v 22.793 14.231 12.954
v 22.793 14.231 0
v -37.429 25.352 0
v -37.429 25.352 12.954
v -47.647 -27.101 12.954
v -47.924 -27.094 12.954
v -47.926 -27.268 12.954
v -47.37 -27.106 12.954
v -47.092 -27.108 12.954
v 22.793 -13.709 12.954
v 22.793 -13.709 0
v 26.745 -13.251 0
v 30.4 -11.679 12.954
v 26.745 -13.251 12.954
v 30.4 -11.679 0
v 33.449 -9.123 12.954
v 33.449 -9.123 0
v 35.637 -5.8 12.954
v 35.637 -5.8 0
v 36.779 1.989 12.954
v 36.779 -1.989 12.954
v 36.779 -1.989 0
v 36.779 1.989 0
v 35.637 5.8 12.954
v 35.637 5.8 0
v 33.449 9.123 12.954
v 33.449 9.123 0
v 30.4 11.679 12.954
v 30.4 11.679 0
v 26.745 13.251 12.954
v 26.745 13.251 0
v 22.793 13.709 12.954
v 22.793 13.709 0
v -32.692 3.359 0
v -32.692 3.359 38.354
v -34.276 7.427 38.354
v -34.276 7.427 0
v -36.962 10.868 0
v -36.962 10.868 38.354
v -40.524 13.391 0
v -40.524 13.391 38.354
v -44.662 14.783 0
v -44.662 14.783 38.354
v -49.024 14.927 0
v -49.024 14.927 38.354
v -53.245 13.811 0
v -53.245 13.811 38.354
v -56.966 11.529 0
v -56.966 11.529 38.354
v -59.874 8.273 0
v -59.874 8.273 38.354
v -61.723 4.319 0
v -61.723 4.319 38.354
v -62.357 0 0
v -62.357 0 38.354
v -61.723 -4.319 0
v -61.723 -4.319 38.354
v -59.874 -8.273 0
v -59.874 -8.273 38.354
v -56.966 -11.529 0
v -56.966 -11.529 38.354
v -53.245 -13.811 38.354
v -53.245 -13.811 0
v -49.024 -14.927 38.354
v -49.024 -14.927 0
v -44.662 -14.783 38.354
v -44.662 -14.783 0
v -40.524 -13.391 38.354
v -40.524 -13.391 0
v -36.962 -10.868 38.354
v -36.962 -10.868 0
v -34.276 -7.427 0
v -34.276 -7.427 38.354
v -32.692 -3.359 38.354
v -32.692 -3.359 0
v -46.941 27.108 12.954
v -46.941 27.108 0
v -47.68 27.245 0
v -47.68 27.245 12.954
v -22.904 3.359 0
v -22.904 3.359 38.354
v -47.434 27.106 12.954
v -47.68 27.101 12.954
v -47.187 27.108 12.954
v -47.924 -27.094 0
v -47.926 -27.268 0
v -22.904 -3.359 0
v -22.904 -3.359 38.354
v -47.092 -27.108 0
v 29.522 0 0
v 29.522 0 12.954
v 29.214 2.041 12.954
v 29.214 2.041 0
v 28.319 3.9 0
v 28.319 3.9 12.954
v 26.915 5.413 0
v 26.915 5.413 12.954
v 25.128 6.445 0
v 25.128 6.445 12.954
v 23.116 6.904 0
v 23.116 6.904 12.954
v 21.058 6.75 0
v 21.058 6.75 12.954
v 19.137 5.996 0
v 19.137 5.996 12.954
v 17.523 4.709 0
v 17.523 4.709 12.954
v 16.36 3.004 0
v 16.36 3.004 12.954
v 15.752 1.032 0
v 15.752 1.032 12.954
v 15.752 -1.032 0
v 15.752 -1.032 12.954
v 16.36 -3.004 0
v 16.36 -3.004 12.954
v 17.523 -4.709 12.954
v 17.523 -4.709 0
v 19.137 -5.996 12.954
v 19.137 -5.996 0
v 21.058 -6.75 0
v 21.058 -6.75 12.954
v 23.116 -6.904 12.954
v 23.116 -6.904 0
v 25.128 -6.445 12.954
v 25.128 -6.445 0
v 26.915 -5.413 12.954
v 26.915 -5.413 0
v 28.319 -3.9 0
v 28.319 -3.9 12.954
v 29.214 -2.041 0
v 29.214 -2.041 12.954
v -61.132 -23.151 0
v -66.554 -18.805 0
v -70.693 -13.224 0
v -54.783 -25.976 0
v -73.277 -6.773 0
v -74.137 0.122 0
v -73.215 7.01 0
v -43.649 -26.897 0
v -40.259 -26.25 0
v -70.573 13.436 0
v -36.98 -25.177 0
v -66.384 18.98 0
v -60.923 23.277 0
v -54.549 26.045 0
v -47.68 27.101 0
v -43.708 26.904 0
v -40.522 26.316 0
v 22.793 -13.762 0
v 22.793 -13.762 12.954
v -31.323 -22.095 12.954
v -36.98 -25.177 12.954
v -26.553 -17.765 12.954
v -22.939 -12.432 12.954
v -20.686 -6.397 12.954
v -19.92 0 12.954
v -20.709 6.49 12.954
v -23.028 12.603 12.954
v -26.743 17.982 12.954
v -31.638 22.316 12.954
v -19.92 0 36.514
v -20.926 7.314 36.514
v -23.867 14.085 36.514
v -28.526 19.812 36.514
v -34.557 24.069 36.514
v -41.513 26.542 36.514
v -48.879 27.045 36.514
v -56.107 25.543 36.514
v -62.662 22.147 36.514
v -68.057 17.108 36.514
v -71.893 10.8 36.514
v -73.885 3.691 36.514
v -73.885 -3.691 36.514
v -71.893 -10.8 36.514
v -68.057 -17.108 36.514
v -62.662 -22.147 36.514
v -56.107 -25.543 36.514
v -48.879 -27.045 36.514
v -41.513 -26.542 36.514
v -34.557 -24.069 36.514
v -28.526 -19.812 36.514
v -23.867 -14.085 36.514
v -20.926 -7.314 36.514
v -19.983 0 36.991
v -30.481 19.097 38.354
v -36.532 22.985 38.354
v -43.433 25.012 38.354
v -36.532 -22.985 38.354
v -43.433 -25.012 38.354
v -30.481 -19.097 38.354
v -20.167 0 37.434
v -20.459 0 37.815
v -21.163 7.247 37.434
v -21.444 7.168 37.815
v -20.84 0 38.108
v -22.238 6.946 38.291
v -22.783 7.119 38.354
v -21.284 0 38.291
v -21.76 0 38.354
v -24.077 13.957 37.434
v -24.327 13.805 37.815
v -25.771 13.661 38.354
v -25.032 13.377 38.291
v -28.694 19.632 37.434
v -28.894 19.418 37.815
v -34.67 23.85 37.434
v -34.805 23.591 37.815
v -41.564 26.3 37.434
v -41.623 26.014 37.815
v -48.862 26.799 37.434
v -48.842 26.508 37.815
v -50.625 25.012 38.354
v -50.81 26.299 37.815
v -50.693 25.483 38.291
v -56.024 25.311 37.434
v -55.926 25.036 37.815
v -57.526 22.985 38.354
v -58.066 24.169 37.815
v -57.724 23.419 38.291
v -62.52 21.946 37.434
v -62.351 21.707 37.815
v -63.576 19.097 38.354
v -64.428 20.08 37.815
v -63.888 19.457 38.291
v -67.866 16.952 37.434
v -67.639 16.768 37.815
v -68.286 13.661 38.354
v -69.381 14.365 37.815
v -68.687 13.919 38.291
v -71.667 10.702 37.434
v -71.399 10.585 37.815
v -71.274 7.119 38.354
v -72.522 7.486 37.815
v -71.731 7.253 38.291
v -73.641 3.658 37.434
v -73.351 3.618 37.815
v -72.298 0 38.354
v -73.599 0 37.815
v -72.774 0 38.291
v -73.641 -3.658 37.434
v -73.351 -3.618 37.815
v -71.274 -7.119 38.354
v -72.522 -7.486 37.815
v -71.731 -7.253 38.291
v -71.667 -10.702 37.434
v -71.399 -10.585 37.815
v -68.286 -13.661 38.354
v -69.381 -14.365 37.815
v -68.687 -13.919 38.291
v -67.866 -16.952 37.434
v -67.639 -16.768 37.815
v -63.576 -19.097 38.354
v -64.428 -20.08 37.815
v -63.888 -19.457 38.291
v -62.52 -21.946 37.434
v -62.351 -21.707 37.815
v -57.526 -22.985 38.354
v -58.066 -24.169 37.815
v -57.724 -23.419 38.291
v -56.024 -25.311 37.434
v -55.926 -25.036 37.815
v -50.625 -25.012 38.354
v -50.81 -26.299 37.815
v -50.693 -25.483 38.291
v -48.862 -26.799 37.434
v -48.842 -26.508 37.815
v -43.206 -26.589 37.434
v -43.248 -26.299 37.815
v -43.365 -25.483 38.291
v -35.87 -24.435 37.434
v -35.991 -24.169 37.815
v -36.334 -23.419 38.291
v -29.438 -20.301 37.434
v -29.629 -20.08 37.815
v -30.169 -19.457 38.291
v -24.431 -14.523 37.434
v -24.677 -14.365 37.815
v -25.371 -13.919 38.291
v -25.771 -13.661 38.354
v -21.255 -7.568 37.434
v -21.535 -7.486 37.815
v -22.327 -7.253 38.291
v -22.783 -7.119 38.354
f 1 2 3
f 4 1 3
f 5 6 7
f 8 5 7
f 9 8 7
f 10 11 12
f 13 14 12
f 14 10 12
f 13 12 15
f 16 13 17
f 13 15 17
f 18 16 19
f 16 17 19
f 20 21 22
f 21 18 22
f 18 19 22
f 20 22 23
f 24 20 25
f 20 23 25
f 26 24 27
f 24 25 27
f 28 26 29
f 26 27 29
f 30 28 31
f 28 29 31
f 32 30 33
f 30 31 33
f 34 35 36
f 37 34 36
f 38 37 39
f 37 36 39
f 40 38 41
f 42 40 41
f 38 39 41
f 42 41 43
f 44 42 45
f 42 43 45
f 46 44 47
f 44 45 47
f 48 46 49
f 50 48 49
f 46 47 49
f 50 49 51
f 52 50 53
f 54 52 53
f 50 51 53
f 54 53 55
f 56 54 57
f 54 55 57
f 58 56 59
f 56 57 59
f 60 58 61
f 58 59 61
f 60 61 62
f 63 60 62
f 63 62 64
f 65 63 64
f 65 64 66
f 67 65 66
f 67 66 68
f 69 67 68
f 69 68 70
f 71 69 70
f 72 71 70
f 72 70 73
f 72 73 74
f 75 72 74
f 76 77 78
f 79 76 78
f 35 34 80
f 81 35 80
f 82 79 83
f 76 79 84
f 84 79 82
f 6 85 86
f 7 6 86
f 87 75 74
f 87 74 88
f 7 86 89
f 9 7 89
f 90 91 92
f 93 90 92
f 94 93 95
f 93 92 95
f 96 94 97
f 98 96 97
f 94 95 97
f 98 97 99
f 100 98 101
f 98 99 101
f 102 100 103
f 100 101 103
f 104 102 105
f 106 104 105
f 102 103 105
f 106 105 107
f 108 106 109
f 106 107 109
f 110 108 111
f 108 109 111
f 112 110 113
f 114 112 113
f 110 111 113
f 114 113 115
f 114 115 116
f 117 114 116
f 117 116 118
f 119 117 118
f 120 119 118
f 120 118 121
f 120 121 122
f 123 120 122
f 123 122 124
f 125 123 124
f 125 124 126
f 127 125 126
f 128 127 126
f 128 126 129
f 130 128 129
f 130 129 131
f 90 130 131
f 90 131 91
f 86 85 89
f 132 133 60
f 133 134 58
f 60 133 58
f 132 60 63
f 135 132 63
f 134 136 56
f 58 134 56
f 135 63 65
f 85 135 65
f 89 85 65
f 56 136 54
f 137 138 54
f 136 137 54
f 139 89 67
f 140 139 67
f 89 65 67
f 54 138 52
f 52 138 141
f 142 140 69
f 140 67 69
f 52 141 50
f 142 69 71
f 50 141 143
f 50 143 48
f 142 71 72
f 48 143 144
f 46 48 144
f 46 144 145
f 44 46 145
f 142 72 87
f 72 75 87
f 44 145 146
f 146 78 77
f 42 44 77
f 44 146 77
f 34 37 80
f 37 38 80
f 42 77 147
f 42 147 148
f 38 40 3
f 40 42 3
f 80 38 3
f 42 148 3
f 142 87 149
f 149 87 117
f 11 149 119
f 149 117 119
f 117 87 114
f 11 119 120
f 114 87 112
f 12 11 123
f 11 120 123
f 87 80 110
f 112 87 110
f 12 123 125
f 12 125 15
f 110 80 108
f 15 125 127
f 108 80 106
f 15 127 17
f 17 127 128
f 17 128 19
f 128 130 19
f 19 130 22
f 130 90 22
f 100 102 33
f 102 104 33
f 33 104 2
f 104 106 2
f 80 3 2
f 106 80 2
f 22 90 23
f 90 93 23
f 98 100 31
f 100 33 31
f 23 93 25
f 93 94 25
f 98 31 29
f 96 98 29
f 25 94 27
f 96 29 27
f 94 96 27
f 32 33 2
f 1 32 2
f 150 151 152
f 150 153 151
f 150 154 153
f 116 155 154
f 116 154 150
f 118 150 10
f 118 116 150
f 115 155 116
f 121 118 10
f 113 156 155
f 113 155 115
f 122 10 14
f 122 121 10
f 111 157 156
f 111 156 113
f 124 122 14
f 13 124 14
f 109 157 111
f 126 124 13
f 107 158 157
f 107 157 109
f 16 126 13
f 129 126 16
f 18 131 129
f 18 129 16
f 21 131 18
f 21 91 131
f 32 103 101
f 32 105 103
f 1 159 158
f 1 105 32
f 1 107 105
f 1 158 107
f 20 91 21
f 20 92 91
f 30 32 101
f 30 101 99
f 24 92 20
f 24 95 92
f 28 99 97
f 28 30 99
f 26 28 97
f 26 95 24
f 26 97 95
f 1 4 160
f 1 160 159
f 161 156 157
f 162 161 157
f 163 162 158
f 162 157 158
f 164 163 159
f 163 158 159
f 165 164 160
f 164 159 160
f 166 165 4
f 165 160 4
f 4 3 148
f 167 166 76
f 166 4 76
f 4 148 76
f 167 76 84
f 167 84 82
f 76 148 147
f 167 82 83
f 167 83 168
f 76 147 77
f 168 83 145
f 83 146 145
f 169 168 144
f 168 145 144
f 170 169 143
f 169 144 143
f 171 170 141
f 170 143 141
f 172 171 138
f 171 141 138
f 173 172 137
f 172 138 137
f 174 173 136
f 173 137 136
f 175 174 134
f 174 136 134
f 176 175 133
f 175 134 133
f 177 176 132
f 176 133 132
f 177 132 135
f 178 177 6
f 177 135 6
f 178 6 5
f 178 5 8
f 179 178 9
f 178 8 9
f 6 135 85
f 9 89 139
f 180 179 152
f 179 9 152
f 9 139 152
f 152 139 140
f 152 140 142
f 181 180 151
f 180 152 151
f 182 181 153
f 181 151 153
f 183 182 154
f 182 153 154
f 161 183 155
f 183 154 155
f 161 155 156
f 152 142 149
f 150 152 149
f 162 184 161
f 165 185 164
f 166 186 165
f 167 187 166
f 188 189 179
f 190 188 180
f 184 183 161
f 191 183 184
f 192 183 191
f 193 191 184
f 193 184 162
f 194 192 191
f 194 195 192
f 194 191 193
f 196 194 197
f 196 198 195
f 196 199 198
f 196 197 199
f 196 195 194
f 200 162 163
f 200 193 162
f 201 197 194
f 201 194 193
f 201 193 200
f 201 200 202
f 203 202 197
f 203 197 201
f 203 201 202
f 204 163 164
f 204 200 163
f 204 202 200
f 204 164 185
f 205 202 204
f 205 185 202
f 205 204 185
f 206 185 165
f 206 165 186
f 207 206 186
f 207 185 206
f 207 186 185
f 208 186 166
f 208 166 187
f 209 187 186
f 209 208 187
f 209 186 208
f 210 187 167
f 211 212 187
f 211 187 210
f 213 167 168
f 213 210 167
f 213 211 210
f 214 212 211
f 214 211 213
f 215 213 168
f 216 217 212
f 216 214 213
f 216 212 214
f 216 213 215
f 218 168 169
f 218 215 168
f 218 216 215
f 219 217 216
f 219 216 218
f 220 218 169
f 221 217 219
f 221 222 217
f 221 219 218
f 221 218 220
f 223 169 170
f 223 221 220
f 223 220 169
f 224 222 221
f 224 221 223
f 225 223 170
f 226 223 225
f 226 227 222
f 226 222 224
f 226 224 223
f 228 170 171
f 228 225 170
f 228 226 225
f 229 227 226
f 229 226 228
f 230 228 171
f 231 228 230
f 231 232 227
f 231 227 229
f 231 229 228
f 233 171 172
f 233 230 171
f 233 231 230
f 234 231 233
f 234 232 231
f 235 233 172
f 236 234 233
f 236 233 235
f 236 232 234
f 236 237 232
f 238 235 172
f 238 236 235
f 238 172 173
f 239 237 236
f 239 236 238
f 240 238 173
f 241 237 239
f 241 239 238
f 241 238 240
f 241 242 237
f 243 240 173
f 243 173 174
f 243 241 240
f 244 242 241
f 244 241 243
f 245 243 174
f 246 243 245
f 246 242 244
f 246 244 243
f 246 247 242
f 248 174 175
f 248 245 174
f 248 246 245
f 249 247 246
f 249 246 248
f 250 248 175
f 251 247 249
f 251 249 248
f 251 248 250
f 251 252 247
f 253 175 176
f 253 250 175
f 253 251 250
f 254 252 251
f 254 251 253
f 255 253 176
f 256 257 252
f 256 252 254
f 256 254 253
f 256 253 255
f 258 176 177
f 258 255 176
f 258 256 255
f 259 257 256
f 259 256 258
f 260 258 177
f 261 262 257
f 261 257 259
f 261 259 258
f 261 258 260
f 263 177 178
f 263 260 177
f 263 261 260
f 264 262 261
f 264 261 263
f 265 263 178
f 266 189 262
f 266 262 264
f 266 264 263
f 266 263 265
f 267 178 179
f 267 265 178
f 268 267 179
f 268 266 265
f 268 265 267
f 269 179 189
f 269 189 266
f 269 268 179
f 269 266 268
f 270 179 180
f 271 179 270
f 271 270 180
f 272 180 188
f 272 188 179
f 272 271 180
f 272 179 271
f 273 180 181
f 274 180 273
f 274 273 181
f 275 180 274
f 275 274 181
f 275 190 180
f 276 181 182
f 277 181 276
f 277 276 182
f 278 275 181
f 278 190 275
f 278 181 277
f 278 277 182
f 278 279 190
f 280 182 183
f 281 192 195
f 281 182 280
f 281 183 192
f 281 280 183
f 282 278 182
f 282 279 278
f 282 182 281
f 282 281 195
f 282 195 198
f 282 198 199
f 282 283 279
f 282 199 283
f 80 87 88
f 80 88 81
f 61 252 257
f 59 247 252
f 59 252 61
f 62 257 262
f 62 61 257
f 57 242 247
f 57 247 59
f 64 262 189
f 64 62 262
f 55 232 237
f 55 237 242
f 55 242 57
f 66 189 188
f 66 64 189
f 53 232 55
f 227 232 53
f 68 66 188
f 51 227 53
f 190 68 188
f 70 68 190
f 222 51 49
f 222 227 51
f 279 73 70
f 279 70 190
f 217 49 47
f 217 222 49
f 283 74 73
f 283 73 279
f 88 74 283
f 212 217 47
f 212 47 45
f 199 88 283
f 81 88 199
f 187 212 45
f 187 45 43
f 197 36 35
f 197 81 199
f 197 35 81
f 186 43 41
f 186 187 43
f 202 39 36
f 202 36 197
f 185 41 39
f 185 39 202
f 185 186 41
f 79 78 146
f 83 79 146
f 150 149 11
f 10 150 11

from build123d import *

# Parameters (mm, degrees)
F3_DEPTH  = 12.954
F1_R      = 13.7150037279
F0_R      = 27.1085366246
F4_DEPTH  = 25.4
F6_R      = 15.022792706
F7_W      = 16.4906103164
F7_H      = 6.7183971405
F8_DEPTH  = 56.134
F9_R      = 1.8396307345
F11_R     = 6.9234827164
F12_DEPTH = 40.894


with BuildPart() as f3:
    # F2 (on Top) → F3 (new body)
    with BuildSketch(Plane.XY):
        Polygon((-47.680426389, 27.2449441254), (-47.680426389, 0), (-47.925978899, -27.2676609457), (22.7930769324, -13.7622868642), (22.7930769324, 0), (22.7930769324, 14.2306741327), align=None)
    extrude(amount=F3_DEPTH)



with BuildPart() as f3b:
    # F1 (on Top) → F3, piece 2 (new body)
    with BuildSketch(Plane.XY):
        with Locations((23.2090074569, 0)):
            Circle(F1_R)
    extrude(amount=F3_DEPTH)


with BuildPart() as f3c:
    # F0 (on Top) → F3, piece 3 (new body)
    with BuildSketch(Plane.XY):
        with Locations((-47.0287799835, 0)):
            Circle(F0_R)
    extrude(amount=F3_DEPTH)


with BuildPart() as f3_1:
    add(f3.part)
    # F4 (add): a face of the model
    f4_faces = [f3c.part.faces().sort_by_distance(p)[0] for p in [
        (-47.0287799835, 0, 12.954),
    ]]

    add(f3b.part)  # F4 merges F3b

    add(f3c.part)  # F4 merges F3c
    extrude(f4_faces, amount=F4_DEPTH)

    # F6 (on offset) + F7 (on offset) → F8 (cut)
    with BuildSketch(Plane.XY.offset(48.514)):
        with Locations((-47.3341606557, 0)):
            Circle(F6_R)
    with BuildSketch(Plane.XY.offset(48.514)):
        with Locations((-31.1489319429, 0)):
            Rectangle(F7_W, F7_H)
    extrude(amount=-F8_DEPTH, mode=Mode.SUBTRACT)

    # F9
    f9_edges = [f3_1.edges().sort_by_distance(p)[0] for p in [
        (-74.137317, 0, 38.354),
    ]]
    fillet(f9_edges, radius=F9_R)

    # F11 (on offset) → F12 (cut)
    with BuildSketch(Plane.XY.offset(16.002)):
        with Locations((22.5982461125, 0)):
            Circle(F11_R)
    extrude(amount=-F12_DEPTH, mode=Mode.SUBTRACT)


solid = f3_1.part
